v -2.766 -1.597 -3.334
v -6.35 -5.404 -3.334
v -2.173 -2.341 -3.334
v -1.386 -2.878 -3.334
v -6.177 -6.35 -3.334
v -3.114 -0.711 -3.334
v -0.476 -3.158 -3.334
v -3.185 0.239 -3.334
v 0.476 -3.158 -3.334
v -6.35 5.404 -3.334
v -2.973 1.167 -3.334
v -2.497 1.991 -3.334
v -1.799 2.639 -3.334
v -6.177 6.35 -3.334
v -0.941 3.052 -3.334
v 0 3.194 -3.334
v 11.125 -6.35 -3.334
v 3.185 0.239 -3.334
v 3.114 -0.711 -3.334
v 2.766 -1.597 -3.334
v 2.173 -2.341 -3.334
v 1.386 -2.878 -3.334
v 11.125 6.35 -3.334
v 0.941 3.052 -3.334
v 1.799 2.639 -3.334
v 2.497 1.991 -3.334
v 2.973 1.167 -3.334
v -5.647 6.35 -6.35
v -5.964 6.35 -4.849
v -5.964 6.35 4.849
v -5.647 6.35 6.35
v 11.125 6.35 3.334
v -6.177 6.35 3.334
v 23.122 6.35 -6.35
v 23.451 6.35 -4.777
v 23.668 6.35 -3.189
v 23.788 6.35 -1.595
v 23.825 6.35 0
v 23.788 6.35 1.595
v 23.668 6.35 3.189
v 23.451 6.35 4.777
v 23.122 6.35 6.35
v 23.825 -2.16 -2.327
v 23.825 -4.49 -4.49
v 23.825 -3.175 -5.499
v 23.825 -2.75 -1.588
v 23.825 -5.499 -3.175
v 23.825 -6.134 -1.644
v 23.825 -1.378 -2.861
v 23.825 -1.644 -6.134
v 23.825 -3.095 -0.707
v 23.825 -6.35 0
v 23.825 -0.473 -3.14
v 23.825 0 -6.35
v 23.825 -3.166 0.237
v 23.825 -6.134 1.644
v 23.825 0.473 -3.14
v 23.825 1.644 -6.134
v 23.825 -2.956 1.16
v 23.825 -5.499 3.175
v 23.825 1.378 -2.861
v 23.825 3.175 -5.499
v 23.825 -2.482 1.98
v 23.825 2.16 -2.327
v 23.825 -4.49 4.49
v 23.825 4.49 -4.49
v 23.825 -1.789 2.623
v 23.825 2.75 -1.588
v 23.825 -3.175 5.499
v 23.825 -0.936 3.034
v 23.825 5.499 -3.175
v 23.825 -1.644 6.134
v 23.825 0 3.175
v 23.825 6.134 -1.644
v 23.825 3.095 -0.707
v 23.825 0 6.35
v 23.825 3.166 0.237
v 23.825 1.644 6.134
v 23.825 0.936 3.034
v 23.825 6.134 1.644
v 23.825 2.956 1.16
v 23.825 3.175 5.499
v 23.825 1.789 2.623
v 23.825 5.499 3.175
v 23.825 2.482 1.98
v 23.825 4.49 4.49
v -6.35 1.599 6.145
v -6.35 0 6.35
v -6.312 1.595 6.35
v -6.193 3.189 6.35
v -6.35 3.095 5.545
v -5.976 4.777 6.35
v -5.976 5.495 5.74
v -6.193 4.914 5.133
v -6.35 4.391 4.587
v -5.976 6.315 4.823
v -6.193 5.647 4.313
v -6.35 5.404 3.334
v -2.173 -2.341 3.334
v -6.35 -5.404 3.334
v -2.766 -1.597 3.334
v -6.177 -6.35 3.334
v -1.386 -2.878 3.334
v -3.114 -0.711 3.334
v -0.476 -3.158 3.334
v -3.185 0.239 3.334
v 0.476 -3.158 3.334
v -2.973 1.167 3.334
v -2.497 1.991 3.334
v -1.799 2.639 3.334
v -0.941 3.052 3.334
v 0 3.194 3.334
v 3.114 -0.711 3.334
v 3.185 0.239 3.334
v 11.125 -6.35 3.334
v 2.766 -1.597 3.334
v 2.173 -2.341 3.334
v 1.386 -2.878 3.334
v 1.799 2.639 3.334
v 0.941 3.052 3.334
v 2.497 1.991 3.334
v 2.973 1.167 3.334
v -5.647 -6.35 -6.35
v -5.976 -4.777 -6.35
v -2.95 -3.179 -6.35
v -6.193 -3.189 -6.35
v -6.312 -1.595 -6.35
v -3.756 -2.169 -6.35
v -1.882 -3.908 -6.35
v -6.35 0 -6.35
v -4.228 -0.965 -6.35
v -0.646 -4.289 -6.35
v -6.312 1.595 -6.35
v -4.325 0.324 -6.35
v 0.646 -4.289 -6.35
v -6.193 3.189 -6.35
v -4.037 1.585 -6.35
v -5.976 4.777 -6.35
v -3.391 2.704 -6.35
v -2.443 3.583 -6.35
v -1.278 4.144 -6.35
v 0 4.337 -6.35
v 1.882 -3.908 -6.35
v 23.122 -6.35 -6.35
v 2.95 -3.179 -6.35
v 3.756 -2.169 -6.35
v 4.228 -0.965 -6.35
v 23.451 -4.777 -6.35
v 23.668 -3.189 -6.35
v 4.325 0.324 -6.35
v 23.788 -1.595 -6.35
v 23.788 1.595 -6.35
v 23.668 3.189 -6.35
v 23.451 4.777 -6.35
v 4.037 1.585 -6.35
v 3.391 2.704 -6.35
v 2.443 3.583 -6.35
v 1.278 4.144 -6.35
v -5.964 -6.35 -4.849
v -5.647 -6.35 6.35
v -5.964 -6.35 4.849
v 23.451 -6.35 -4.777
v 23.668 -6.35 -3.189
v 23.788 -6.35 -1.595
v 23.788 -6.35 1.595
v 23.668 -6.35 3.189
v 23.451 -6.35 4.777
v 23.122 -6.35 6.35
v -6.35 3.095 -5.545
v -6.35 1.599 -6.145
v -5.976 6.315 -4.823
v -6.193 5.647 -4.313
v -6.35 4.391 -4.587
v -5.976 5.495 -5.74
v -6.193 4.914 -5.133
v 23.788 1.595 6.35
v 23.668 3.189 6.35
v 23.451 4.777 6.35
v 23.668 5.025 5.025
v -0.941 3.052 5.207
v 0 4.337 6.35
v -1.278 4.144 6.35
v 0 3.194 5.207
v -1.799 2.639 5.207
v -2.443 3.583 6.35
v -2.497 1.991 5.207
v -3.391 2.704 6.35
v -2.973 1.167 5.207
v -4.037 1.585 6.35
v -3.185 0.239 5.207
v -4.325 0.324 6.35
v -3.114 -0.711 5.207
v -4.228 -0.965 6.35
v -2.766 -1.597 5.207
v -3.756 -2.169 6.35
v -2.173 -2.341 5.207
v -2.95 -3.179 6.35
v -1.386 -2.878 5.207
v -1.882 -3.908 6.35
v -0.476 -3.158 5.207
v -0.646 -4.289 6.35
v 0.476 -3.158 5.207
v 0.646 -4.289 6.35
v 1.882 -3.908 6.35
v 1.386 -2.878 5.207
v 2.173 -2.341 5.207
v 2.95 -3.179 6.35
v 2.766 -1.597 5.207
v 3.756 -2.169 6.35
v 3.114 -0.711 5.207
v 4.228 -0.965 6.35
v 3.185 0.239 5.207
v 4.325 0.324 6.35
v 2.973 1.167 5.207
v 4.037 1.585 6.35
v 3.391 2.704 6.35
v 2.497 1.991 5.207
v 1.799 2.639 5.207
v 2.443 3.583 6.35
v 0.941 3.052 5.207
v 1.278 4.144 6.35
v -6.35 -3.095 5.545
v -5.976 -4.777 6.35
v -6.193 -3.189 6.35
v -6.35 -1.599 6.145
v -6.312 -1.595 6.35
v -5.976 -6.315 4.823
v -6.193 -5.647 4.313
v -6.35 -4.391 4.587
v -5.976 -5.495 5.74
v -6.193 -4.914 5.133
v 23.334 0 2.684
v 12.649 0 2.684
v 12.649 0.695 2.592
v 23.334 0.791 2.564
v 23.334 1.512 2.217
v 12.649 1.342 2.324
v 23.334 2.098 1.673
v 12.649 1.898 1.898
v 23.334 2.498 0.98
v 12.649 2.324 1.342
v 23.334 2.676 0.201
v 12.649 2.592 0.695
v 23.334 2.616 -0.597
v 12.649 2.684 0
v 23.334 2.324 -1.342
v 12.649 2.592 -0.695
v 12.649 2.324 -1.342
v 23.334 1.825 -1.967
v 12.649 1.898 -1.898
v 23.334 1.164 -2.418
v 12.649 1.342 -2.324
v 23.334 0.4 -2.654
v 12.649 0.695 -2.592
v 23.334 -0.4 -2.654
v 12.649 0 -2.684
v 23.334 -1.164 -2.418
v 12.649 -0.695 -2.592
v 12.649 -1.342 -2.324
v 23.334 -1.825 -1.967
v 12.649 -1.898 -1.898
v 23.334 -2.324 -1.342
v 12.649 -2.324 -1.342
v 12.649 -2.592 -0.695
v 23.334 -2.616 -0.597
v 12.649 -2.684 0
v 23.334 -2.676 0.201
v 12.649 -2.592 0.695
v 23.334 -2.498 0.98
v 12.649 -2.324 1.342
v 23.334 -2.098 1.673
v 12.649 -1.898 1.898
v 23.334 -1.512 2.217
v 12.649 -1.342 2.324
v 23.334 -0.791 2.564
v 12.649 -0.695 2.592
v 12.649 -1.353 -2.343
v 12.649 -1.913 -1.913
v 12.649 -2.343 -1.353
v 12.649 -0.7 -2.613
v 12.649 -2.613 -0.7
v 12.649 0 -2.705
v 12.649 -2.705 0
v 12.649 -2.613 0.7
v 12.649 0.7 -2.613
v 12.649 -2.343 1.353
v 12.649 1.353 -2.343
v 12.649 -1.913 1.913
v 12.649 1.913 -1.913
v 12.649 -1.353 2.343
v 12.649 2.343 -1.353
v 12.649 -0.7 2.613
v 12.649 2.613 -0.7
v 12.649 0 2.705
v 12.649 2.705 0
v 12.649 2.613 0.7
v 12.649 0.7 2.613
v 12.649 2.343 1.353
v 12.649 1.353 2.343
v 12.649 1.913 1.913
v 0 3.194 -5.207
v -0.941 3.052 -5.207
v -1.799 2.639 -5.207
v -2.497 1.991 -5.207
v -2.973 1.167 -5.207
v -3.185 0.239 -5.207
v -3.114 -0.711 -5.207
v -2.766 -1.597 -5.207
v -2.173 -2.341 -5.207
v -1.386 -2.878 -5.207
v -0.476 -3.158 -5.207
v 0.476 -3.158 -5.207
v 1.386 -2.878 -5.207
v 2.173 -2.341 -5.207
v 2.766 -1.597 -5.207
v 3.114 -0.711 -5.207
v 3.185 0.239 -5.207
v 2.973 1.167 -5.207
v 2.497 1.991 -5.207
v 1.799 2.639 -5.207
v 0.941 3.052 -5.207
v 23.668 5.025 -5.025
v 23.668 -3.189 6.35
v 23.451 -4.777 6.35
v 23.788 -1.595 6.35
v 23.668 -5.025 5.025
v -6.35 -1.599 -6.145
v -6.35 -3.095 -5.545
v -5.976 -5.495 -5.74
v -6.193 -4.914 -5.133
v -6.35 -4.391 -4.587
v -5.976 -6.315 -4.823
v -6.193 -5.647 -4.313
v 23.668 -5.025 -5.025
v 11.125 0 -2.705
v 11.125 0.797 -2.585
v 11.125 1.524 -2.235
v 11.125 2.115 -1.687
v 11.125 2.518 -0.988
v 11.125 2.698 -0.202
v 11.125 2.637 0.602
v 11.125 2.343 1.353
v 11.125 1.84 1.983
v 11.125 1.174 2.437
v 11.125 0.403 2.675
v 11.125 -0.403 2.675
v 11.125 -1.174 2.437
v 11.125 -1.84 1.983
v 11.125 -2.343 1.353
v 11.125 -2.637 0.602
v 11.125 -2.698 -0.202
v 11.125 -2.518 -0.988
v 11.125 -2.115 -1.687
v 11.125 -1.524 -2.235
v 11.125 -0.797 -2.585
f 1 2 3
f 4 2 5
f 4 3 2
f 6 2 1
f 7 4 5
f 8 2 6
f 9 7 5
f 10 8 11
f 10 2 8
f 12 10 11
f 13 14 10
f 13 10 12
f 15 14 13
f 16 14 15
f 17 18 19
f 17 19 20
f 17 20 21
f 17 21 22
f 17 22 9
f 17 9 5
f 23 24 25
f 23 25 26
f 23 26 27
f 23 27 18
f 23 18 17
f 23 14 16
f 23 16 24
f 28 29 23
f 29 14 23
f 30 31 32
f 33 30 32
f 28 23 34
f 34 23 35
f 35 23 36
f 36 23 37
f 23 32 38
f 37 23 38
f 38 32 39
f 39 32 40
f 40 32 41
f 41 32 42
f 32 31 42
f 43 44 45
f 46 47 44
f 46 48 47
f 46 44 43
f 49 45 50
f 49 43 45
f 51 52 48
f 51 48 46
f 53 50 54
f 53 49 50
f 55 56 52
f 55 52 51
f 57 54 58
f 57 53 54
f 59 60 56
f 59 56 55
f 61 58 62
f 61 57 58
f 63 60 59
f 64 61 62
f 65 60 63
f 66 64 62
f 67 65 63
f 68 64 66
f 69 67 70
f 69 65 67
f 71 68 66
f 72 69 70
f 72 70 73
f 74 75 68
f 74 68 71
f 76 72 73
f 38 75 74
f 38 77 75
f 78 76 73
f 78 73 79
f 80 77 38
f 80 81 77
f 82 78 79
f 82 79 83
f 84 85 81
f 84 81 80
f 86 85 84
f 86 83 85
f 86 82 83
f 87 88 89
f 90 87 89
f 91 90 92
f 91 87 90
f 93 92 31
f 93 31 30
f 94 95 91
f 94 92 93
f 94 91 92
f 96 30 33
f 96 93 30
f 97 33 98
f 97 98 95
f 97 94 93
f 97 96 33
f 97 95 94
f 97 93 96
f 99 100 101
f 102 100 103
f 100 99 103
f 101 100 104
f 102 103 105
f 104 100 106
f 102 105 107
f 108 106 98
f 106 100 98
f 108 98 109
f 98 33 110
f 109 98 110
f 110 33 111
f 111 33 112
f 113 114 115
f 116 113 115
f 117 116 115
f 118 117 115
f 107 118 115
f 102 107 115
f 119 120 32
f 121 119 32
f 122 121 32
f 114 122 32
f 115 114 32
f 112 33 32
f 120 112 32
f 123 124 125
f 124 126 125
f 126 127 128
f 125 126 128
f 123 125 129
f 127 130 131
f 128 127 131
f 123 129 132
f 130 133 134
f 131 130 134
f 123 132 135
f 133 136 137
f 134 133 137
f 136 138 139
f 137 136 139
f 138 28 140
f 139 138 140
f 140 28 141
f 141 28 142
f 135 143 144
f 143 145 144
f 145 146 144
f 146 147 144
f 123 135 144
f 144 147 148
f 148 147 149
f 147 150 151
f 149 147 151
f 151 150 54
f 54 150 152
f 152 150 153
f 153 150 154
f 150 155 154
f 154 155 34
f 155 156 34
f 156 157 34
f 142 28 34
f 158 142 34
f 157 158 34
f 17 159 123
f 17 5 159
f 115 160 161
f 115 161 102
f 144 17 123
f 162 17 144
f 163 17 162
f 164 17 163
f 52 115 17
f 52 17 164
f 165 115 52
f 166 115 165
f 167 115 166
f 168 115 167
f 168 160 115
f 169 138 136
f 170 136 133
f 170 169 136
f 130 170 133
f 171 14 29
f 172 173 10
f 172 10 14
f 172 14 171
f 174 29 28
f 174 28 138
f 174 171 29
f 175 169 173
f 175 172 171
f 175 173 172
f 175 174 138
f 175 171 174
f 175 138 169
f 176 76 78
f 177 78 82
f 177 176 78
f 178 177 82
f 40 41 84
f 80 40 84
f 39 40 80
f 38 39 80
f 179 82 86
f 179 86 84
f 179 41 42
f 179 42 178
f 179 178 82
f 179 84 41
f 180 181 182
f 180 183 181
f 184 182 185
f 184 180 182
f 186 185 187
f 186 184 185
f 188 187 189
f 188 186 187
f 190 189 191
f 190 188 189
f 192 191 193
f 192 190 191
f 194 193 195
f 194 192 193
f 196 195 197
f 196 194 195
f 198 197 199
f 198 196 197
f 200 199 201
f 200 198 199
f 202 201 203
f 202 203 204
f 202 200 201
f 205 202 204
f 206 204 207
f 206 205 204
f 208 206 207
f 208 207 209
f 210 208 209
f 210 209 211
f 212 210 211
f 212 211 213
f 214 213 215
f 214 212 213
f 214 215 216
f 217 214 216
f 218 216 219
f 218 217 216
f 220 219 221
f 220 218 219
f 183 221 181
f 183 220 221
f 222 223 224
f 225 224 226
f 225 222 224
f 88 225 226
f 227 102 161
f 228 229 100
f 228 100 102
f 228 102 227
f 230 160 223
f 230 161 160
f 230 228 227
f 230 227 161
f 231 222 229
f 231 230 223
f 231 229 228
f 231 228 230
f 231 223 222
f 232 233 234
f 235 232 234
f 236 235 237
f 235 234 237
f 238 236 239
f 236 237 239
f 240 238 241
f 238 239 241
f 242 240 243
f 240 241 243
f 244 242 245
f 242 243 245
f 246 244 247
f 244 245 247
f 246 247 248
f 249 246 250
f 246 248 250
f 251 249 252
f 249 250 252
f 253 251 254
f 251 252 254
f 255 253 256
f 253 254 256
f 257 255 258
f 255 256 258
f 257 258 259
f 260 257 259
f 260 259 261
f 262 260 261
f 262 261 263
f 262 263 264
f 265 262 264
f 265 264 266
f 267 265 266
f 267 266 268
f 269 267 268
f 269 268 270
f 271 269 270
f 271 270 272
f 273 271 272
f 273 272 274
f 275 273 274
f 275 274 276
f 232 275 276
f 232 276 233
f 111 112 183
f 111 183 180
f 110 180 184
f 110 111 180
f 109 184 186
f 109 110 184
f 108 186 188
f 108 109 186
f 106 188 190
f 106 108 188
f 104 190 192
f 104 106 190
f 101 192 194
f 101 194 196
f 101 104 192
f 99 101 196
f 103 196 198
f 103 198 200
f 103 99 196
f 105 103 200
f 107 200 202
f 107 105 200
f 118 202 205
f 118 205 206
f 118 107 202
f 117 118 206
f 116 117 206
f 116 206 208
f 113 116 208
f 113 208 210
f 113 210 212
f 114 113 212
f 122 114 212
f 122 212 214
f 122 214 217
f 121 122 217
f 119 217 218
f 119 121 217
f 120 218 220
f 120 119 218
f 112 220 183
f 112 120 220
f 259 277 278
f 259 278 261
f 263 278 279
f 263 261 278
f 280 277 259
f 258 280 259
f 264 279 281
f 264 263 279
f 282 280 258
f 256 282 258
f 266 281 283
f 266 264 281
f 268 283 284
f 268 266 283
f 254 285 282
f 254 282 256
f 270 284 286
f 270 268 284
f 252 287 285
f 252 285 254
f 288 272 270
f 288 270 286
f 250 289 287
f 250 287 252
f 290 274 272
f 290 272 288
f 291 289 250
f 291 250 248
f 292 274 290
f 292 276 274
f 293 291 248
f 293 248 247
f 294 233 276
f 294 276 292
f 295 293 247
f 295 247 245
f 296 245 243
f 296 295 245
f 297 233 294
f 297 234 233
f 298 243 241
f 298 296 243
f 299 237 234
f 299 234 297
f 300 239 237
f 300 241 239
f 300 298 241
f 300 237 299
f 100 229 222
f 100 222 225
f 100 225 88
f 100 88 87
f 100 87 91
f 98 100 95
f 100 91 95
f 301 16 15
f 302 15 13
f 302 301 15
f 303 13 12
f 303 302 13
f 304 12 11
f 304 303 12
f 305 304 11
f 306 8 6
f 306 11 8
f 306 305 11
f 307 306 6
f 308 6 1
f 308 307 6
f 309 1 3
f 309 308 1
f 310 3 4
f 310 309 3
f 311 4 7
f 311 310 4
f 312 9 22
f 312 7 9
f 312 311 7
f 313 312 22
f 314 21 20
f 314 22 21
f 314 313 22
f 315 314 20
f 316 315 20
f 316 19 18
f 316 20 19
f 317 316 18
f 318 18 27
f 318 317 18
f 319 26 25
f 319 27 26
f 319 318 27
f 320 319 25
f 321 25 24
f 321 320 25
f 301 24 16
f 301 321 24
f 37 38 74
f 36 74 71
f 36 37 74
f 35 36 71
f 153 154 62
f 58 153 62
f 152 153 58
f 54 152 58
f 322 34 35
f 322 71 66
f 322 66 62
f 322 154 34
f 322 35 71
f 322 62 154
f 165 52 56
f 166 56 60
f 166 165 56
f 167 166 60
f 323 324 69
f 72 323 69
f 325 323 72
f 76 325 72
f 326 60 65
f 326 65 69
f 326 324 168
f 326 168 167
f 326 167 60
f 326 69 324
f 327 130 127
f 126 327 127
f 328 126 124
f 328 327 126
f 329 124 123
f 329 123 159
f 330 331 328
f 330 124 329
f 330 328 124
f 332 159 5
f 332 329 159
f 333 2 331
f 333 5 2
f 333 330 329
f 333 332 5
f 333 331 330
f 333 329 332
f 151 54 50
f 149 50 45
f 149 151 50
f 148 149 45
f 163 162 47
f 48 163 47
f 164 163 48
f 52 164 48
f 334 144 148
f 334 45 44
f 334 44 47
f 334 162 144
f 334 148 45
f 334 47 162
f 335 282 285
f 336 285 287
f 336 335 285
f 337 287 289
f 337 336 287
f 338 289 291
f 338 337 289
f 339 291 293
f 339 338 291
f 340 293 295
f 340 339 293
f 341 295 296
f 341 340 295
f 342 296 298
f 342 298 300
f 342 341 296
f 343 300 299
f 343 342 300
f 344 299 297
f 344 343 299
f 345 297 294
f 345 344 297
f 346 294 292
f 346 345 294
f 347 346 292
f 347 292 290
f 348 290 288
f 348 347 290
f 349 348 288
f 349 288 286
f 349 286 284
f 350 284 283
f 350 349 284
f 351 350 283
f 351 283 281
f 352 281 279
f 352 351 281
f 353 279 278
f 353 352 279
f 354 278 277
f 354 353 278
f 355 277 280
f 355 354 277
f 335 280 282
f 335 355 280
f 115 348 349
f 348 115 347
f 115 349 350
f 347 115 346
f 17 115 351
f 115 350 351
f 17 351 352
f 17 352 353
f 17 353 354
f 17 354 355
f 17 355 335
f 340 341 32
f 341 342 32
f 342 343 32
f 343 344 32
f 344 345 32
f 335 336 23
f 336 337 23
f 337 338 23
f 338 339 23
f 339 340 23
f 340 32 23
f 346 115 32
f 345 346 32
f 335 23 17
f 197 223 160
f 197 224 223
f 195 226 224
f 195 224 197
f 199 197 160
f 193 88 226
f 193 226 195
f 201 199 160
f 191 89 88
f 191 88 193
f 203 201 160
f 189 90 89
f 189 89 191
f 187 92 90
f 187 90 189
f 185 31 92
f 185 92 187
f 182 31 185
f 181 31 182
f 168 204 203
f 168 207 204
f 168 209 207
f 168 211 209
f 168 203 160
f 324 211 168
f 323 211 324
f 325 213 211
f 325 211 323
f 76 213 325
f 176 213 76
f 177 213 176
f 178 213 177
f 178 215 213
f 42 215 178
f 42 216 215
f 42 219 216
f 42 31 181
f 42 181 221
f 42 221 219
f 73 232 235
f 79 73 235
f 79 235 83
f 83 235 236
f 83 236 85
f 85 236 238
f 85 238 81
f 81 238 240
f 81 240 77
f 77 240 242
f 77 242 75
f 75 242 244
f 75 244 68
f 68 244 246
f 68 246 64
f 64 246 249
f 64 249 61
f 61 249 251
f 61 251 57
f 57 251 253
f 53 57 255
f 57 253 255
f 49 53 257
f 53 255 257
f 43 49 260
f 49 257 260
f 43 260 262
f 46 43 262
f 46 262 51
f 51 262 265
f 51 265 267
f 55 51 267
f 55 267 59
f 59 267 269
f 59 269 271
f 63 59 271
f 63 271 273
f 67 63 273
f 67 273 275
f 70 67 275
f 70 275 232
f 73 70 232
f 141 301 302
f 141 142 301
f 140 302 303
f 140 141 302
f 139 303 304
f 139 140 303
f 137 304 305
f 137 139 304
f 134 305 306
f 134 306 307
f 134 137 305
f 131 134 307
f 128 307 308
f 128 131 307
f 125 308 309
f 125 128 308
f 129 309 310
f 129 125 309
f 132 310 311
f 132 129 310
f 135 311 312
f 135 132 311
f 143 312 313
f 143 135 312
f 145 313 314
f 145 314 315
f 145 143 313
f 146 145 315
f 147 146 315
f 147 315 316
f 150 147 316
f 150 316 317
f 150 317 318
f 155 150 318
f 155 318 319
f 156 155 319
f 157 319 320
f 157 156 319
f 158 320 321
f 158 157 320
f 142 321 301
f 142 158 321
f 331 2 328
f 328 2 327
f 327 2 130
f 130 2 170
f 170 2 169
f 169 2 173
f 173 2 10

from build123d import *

# Parameters (mm, degrees)
BOSS_EXTRUDE1_DEPTH      = 6.35
BOSS_EXTRUDE1_DEPTH_BACK = 6.35
SKETCH1_W                = 30.1752
SKETCH1_H                = 12.7
CUT_EXTRUDE1_DEPTH       = 6.35
CUT_EXTRUDE1_DEPTH_BACK  = 6.35
SKETCH2_W                = 17.4752
SKETCH2_H                = 6.6675
HOLE1_D                  = 5.36702
HOLE1_DEPTH              = 11.176
HOLE1_CSINK_D            = 6.35
HOLE1_CSINK_ANGLE        = 90
SKETCH5_W                = 2.7051
SKETCH5_H                = 1.524


with BuildPart() as part:
    # Sketch1 → Boss-Extrude1 (new, two sides: drawn at the far end of the back side and taken through both)
    with BuildSketch(Plane.XY.offset(-BOSS_EXTRUDE1_DEPTH_BACK)):
        with Locations((8.7376, 0)):
            Rectangle(SKETCH1_W, SKETCH1_H)
    extrude(amount=BOSS_EXTRUDE1_DEPTH + BOSS_EXTRUDE1_DEPTH_BACK)

    # Sketch2 → Cut-Extrude1 (cut, two sides: drawn at the far end of the back side and taken through both)
    with BuildSketch(Plane(origin=(0, 0, 0), x_dir=(1, 0, 0), z_dir=(0, 1, 0)).offset(-CUT_EXTRUDE1_DEPTH_BACK)):
        with Locations((2.3876, 0)):
            Rectangle(SKETCH2_W, SKETCH2_H)
    extrude(amount=CUT_EXTRUDE1_DEPTH + CUT_EXTRUDE1_DEPTH_BACK, mode=Mode.SUBTRACT)

    # Hole1
    with Locations(Plane(origin=(23.8252, 0, 0), x_dir=(0, 0, -1), z_dir=(1, 0, 0))):
        with Locations((0, 0)):
            CounterSinkHole(HOLE1_D / 2, HOLE1_CSINK_D / 2, depth=HOLE1_DEPTH, counter_sink_angle=HOLE1_CSINK_ANGLE)

    # Sketch5 → Hole2 (revolve, cut)
    with BuildSketch(Plane(origin=(12.6492, 0, 0), x_dir=(0, 0, -1), z_dir=(0, 1, 0))):
        with Locations((1.35255, 0.762)):
            Rectangle(SKETCH5_W, SKETCH5_H)
    revolve(axis=Axis((-97.3508, 0, 0), (1, 0, 0)), mode=Mode.SUBTRACT)

    # Sketch7 → Cut-Revolve1 (revolve, cut)
    with BuildSketch(Plane(origin=(0, 0, 0), x_dir=(0, 0, -1), z_dir=(1, 0, 0))):
        Polygon((-6.35, 0), (-6.35, 4.33705), (-5.207, 3.19405), (5.207, 3.19405), (6.35, 4.33705), (6.35, 0), align=None)
    revolve(axis=Axis((0, 0, -6.35), (0, 0, 1)), mode=Mode.SUBTRACT)

    # Sketch8 → Cut-Revolve2 (revolve, cut)
    with BuildSketch(Plane.XY):
        with BuildLine():
            Line((23.8252, 0), (23.8252, 6.35))
            ThreePointArc((23.8252, 6.35), (22.869586956, 9.650754782), (21.2852, 12.7))
            Line((21.2852, 12.7), (30.1752, 12.7))
            Line((30.1752, 12.7), (30.1752, 0))
            Line((30.1752, 0), (23.8252, 0))
        make_face()
    revolve(axis=Axis((30.1752, 0, 0), (-1, 0, 0)), mode=Mode.SUBTRACT)

    # Sketch9 → Cut-Revolve3 (revolve, cut)
    with BuildSketch(Plane.XY):
        with BuildLine():
            Line((-12.7, 0), (-12.7, 12.7))
            Line((-12.7, 12.7), (-3.81, 12.7))
            ThreePointArc((-3.81, 12.7), (-5.394386956, 9.650754782), (-6.35, 6.35))
            Line((-6.35, 6.35), (-6.35, 0))
            Line((-6.35, 0), (-12.7, 0))
        make_face()
    revolve(axis=Axis((-6.35, 0, 0), (-1, 0, 0)), mode=Mode.SUBTRACT)


solid = part.part
